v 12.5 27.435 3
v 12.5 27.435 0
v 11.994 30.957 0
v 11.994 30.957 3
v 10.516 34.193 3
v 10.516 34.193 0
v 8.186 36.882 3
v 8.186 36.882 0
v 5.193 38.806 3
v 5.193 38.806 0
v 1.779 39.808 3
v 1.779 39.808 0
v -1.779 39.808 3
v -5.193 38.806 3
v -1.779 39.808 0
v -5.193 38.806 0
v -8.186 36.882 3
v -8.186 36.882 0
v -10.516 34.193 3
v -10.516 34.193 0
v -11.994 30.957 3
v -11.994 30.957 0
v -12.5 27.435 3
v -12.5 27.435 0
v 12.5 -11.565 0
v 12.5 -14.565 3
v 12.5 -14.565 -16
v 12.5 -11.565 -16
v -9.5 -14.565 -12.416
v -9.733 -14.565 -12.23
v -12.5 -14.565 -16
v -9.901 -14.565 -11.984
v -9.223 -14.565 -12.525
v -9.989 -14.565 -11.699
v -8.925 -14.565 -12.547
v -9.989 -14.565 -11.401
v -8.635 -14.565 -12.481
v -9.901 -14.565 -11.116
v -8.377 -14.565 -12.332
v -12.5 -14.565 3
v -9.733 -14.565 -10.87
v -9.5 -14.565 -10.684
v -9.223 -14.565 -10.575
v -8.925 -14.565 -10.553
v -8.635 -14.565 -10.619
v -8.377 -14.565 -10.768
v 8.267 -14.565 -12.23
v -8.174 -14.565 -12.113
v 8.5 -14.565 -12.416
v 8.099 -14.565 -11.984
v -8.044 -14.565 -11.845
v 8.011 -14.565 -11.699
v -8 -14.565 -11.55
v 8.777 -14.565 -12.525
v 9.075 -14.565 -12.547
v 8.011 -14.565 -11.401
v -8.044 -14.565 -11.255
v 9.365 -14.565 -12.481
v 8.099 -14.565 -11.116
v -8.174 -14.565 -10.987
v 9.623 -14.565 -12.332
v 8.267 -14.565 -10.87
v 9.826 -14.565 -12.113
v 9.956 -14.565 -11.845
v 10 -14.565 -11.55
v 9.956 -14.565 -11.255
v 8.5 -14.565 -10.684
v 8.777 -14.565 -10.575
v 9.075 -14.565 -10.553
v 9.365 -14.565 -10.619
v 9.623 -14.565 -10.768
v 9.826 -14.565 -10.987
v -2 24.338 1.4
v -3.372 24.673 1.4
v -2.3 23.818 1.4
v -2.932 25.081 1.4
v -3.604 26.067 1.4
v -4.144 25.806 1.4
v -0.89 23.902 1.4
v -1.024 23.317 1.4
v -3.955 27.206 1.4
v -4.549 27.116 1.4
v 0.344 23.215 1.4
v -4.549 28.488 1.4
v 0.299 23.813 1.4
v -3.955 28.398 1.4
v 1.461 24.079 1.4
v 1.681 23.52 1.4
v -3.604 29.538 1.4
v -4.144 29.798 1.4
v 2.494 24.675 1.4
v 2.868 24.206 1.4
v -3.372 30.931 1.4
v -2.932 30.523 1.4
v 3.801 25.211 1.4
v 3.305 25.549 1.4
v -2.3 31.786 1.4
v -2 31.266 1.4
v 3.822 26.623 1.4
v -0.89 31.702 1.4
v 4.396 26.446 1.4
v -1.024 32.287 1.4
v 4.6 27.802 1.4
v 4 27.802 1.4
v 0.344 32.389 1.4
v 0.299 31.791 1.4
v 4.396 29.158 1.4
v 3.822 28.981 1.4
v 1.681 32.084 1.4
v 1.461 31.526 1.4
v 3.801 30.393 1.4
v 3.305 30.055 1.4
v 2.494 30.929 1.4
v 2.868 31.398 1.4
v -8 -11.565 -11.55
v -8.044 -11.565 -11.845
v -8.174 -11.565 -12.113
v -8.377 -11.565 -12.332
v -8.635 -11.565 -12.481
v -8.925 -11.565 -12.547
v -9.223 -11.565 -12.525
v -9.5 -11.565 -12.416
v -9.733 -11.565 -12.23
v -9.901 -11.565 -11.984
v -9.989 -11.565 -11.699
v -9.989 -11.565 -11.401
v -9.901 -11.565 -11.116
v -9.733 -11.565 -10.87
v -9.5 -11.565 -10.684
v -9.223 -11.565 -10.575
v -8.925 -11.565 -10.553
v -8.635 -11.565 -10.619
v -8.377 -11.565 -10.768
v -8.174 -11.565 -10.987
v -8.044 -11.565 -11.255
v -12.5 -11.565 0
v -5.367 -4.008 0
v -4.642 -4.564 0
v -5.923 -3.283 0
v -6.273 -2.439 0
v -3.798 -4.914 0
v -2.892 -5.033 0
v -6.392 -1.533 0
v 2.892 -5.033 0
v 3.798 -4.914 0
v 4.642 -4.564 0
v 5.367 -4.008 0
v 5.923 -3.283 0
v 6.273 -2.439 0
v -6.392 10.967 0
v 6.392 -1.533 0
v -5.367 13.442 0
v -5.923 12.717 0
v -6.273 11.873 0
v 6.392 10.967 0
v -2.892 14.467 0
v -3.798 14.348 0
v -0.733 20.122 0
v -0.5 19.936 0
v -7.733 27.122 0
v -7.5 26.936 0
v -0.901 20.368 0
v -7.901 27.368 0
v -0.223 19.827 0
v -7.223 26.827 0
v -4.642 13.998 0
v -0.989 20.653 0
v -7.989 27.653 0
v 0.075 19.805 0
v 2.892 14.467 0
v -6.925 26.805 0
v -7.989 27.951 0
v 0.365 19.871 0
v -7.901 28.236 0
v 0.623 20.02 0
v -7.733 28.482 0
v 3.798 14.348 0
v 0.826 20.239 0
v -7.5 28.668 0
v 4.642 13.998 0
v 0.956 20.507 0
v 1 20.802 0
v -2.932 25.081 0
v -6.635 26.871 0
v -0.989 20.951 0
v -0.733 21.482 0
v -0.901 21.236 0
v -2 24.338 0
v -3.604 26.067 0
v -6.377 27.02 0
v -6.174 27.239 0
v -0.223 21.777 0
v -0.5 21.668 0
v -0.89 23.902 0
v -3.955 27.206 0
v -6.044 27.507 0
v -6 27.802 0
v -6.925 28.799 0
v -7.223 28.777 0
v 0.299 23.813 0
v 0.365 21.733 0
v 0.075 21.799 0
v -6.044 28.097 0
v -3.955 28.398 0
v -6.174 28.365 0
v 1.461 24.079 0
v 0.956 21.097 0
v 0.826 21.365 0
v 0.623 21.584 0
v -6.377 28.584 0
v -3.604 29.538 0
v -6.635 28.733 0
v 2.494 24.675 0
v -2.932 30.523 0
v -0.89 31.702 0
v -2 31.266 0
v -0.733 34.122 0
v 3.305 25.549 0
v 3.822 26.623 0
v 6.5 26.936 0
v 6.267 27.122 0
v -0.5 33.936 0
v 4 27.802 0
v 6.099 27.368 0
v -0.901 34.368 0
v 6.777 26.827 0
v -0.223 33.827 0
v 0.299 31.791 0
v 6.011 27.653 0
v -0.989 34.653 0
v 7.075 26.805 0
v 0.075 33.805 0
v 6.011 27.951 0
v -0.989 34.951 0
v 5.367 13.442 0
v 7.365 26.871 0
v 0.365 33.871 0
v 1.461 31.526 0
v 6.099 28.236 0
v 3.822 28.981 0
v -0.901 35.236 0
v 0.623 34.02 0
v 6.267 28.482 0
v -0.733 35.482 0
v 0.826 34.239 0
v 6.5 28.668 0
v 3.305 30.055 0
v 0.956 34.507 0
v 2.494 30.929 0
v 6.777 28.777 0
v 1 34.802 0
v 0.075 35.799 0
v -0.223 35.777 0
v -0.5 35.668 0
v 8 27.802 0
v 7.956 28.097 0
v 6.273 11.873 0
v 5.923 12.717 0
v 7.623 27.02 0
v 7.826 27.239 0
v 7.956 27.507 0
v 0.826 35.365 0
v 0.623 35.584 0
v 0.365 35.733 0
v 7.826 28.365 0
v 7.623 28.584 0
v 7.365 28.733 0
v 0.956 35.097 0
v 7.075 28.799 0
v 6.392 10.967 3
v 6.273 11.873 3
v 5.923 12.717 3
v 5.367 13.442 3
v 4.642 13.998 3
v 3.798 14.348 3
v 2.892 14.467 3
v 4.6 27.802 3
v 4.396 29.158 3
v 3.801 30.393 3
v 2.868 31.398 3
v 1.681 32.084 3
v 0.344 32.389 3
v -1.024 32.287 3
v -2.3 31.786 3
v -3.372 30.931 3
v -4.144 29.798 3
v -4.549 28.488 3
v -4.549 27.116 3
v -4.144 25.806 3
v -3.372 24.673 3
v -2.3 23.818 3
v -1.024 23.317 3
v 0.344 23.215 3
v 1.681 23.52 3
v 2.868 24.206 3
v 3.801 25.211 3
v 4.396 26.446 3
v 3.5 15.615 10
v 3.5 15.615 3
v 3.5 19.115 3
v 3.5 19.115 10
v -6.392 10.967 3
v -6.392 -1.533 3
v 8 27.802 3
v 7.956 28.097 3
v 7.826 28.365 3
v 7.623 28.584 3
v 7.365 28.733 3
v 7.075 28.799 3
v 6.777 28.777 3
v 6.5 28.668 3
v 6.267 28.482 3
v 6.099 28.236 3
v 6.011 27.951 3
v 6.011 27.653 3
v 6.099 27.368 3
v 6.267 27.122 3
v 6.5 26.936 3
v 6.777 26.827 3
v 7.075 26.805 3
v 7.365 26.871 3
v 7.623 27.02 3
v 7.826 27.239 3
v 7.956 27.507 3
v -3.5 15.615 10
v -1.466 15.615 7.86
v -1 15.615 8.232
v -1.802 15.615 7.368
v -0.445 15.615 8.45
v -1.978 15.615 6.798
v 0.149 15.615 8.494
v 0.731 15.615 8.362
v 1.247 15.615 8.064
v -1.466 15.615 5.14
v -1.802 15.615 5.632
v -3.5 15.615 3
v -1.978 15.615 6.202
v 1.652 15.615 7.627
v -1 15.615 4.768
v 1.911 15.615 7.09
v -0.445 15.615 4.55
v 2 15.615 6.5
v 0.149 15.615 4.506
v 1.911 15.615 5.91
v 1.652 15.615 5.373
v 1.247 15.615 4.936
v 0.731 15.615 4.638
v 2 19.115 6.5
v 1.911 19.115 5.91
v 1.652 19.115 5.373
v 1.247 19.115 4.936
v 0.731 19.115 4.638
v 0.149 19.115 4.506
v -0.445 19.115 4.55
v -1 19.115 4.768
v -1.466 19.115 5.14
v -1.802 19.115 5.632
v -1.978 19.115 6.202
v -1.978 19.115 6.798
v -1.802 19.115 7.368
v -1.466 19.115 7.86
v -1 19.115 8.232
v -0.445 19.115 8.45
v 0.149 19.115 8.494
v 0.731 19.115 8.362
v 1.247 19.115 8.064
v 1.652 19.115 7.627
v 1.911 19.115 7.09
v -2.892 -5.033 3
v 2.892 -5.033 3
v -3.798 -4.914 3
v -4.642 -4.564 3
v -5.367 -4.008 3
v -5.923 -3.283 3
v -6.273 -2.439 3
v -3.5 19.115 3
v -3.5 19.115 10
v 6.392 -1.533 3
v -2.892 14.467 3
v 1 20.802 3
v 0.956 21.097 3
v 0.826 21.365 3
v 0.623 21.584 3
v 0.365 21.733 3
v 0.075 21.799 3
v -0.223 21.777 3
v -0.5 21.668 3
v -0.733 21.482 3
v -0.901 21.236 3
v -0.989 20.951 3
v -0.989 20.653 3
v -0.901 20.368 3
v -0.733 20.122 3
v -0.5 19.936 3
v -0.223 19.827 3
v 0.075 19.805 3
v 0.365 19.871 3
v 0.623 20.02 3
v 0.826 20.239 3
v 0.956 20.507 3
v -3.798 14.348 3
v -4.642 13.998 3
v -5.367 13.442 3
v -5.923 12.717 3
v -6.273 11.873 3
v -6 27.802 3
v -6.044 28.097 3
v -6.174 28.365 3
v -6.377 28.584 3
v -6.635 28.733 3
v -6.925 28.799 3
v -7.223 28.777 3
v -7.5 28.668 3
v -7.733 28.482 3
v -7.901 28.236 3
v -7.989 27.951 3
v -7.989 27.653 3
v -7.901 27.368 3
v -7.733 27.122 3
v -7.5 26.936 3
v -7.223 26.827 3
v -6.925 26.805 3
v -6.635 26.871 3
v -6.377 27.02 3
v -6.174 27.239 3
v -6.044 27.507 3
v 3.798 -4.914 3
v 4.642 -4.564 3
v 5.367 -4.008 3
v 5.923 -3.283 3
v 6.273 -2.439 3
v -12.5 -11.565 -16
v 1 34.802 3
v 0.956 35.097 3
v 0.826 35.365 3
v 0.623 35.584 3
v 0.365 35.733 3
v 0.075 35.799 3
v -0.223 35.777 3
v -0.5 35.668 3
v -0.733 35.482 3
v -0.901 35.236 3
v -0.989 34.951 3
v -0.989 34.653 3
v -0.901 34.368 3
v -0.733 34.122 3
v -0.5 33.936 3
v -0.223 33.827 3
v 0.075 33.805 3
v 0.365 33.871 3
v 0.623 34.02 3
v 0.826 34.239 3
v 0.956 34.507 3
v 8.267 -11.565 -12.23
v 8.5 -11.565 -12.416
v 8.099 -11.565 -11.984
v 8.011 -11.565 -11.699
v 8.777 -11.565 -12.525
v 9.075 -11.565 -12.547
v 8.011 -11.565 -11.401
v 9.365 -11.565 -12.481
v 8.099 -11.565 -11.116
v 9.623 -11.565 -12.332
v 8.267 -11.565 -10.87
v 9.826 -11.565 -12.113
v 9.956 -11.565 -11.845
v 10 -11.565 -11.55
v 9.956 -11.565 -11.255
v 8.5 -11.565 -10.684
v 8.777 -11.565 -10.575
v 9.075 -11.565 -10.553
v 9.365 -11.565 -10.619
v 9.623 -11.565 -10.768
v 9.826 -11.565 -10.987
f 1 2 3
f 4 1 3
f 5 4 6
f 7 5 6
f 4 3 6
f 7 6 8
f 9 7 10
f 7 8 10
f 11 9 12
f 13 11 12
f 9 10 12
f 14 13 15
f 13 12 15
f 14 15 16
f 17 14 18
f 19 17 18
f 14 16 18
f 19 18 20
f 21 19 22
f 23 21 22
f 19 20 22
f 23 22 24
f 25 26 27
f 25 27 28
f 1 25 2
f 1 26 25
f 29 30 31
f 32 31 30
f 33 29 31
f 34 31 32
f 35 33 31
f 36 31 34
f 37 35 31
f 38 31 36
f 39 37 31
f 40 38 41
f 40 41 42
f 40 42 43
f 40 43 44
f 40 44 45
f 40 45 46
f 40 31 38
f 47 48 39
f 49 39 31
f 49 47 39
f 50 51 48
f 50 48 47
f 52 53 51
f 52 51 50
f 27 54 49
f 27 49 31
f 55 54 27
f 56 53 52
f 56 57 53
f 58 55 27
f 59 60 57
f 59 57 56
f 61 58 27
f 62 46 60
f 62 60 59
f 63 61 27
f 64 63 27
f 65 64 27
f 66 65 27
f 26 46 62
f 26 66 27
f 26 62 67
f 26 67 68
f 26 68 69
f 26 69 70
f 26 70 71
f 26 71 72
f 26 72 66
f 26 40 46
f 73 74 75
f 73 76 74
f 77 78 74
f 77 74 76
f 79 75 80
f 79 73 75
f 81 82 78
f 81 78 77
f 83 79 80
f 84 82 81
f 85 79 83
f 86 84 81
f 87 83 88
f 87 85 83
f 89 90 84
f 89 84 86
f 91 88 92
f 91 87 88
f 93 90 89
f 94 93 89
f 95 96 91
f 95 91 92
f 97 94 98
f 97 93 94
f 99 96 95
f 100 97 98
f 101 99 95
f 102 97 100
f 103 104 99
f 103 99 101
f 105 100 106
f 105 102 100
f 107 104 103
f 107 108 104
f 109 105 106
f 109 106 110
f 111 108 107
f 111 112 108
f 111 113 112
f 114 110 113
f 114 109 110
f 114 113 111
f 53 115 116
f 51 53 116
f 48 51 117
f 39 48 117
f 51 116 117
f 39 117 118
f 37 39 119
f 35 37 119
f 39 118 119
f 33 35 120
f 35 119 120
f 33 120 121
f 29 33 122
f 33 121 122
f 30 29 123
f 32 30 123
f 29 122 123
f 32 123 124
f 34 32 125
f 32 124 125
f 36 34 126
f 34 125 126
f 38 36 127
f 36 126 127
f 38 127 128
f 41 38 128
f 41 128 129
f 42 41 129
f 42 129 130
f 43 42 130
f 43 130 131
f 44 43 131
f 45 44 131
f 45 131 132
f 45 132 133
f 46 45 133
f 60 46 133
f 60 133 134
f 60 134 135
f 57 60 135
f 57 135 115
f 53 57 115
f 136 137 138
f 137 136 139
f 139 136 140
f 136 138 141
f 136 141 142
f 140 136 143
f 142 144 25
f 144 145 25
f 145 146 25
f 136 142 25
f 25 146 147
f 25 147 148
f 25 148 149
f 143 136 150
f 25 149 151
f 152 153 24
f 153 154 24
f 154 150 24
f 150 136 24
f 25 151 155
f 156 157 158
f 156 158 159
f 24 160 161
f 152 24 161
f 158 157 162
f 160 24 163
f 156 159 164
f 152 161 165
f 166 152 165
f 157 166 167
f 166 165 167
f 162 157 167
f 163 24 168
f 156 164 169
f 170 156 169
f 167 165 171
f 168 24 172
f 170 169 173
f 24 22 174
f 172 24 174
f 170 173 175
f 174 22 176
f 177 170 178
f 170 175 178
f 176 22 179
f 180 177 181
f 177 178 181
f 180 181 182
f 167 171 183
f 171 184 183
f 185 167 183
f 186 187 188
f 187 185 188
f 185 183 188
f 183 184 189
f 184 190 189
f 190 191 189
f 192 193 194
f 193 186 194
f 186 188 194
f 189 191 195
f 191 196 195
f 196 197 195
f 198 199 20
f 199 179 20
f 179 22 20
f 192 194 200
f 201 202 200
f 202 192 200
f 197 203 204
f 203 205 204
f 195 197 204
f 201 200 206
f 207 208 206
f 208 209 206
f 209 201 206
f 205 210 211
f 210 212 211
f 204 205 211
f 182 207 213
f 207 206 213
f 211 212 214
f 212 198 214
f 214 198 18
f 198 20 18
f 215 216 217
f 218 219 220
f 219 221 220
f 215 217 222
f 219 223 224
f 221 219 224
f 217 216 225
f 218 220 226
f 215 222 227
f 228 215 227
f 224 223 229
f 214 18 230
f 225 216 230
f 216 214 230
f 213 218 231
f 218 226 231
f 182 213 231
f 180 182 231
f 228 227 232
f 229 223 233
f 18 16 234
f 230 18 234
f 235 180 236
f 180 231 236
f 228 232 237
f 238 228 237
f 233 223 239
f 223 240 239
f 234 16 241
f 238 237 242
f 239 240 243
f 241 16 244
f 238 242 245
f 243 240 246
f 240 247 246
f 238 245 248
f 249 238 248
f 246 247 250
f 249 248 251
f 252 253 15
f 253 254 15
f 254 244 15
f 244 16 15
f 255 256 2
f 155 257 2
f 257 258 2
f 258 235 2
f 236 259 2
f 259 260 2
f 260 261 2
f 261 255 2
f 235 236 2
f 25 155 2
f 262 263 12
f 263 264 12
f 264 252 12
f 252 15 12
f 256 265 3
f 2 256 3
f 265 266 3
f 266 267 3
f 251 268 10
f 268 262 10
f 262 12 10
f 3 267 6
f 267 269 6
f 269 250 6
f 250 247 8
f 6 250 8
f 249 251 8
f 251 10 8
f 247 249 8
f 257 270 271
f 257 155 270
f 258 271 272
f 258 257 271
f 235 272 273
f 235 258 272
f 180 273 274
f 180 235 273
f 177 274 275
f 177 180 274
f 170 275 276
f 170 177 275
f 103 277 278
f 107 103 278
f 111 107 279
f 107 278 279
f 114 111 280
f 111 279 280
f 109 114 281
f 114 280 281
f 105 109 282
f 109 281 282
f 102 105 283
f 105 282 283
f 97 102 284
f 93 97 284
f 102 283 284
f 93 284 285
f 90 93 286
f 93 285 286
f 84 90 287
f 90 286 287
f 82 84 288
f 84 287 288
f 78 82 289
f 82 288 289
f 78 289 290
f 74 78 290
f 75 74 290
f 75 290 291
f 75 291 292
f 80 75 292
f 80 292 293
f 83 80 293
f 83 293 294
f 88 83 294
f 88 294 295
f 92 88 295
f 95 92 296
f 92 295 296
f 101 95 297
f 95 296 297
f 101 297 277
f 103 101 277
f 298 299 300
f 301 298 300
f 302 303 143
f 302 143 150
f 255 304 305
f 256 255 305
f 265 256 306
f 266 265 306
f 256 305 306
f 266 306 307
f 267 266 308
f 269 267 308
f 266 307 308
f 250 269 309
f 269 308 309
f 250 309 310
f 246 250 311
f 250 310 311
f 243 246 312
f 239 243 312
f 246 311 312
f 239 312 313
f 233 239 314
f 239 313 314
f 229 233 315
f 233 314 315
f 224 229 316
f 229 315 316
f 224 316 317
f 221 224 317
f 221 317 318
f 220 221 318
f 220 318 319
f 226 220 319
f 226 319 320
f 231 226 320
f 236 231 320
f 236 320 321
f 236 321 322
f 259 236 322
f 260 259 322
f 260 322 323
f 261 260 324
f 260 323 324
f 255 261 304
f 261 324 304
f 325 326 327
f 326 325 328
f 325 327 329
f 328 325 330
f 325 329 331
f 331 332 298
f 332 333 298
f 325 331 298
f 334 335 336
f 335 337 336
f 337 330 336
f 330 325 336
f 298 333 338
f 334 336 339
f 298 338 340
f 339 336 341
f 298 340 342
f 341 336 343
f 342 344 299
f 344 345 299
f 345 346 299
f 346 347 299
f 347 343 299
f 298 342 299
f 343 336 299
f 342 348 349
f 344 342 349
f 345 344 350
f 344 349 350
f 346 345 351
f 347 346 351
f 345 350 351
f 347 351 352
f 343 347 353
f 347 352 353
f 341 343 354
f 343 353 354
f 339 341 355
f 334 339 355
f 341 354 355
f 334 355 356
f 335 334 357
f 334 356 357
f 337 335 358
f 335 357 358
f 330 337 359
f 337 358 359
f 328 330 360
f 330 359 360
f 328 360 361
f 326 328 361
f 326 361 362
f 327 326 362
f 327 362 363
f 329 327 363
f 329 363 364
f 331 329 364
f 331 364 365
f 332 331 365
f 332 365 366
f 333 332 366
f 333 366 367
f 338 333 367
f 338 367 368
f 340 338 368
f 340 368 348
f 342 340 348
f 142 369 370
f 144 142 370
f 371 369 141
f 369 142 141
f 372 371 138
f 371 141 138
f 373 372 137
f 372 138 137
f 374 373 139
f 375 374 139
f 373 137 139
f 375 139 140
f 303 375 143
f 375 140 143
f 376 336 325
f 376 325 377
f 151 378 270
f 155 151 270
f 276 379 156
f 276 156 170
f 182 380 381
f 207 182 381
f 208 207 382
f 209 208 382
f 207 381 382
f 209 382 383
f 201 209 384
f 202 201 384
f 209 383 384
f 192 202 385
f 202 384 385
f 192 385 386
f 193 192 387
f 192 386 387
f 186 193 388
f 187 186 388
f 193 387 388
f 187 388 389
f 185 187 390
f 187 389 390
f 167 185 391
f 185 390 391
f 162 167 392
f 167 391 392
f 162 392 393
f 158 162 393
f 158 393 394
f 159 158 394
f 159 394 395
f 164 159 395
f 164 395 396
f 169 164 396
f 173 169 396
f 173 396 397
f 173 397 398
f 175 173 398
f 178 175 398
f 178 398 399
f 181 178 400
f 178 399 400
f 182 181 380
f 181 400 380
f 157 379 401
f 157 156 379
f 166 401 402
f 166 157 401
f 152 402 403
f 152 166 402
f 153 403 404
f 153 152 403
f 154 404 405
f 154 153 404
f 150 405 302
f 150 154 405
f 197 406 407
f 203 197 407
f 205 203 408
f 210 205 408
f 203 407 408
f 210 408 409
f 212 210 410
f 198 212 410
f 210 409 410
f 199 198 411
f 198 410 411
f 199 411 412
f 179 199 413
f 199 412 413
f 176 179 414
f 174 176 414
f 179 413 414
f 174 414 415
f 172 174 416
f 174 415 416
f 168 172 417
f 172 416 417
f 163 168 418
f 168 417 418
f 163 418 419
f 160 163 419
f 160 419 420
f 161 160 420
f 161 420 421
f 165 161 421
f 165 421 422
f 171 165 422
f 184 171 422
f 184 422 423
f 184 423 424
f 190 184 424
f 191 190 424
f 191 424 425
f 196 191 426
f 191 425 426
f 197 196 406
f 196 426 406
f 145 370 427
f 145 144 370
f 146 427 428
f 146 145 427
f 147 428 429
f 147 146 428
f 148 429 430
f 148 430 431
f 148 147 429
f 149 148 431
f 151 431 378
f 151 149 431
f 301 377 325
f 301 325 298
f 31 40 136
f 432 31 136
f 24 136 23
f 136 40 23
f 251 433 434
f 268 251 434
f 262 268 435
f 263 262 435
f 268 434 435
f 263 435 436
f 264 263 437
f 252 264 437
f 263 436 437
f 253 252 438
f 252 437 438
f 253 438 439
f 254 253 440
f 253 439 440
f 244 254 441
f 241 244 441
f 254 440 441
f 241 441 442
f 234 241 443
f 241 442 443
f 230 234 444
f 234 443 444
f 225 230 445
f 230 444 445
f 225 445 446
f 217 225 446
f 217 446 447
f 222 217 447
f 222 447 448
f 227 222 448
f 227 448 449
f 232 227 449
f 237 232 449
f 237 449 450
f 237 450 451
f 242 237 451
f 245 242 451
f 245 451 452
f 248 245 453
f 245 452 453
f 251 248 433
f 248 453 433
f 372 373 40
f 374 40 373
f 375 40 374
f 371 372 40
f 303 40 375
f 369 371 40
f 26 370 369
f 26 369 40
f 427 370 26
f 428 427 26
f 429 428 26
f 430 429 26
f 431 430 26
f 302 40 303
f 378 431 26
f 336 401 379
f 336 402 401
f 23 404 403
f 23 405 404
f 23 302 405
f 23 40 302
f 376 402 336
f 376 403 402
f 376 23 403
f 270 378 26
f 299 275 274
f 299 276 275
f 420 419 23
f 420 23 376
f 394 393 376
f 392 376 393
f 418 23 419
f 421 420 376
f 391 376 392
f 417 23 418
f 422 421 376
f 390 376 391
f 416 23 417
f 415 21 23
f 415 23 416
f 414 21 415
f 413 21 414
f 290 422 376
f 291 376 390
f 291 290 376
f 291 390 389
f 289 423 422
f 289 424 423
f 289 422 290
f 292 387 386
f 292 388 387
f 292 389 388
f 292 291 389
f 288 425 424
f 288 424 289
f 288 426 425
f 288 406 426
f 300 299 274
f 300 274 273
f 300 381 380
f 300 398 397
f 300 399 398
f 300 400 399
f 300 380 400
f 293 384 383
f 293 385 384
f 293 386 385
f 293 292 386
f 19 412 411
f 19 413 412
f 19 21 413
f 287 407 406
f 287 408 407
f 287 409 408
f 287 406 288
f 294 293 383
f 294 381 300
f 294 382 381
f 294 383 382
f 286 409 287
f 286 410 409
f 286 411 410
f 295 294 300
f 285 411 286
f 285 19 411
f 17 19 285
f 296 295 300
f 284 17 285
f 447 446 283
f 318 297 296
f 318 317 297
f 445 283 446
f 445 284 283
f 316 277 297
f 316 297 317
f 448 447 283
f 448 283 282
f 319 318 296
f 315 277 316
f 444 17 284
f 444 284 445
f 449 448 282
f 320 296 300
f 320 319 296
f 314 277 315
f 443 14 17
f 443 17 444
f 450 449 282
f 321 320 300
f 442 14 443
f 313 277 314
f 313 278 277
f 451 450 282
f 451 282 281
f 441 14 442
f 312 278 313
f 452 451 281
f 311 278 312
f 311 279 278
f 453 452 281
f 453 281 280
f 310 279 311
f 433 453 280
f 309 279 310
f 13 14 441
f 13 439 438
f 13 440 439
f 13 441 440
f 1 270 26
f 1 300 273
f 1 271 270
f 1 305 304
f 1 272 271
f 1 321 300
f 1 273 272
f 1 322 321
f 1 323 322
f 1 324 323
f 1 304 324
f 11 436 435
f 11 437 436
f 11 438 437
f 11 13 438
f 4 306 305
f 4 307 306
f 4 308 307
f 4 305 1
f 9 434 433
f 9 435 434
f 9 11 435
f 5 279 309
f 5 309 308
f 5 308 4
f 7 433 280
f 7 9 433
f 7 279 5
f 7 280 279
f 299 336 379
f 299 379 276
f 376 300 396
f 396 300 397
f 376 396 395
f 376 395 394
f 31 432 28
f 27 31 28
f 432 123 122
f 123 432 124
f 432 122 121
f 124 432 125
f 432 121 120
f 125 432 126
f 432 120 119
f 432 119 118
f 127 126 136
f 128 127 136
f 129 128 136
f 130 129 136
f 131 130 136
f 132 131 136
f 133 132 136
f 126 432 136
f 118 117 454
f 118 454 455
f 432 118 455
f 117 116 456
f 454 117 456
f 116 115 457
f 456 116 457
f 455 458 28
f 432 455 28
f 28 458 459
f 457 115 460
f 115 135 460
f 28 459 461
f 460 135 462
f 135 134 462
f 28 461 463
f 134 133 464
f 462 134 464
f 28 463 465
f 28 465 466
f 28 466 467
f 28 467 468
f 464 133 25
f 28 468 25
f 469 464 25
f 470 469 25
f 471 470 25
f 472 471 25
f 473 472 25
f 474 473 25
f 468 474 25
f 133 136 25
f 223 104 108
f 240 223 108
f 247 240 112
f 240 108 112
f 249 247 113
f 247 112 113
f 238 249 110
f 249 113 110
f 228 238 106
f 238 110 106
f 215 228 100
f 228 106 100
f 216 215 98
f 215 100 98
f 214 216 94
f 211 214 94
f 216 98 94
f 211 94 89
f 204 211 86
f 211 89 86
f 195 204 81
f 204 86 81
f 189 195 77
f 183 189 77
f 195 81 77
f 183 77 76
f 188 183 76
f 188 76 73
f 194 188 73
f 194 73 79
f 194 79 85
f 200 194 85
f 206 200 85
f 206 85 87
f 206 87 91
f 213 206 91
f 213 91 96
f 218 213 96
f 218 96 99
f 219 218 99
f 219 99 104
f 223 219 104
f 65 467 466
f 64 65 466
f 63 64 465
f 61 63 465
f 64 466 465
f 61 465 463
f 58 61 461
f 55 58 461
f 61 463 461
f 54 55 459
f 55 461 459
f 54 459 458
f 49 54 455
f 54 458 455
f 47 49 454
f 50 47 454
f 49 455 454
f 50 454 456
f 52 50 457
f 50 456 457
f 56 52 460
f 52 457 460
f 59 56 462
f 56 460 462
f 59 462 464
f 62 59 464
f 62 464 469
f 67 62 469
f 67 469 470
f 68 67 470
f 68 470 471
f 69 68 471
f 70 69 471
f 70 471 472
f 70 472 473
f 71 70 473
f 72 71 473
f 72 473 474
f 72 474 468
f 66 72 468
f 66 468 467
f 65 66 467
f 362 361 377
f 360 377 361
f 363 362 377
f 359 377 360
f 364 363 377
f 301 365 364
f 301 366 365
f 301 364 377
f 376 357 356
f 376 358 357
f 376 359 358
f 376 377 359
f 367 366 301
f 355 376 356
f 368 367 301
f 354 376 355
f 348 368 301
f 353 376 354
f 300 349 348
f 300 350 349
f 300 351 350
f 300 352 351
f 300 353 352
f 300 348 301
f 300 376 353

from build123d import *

# Parameters (mm, degrees)
SKETCH1_W           = 25
SKETCH1_H           = 38.558203604
SKETCH1_H_2         = 3.441796396
BOSS_EXTRUDE1_DEPTH = 3
SKETCH2_R           = 4
SKETCH2_R_2         = 1
CUT_EXTRUDE1_DEPTH  = 3
SKETCH4_R           = 4.6
CUT_EXTRUDE2_DEPTH  = 1.6
SKETCH5_W           = 25
SKETCH5_H           = 3
BOSS_EXTRUDE3_DEPTH = 19
SKETCH7_R           = 1
CUT_EXTRUDE4_DEPTH  = 4
SKETCH8_W           = 12.783853214
SKETCH8_H           = 19.5
CUT_EXTRUDE5_DEPTH  = 4
FILLET1_R           = 3.5
SKETCH9_W           = 7
SKETCH9_H           = 3.5
BOSS_EXTRUDE4_DEPTH = 7
SKETCH10_R          = 2
CUT_EXTRUDE6_DEPTH  = 7


with BuildPart() as part:
    # Sketch1 → Boss-Extrude1 (new body)
    with BuildSketch(Plane.XY):
        with Locations((0, 8.156339421)):
            Rectangle(SKETCH1_W, SKETCH1_H)
        with BuildLine():
            Line((-12.5, 27.435441223), (12.5, 27.435441223))
            ThreePointArc((12.5, 27.435441223), (0, 39.935441223), (-12.5, 27.435441223))
        make_face()
        with Locations((0, -12.843660579)):
            Rectangle(SKETCH1_W, SKETCH1_H_2)
    extrude(amount=BOSS_EXTRUDE1_DEPTH)

    # Sketch2 → Cut-Extrude1 (cut)
    with BuildSketch(Plane.XY.offset(3)):
        with Locations((0, 27.802049159)):
            Circle(SKETCH2_R)
        with Locations((0, 34.802049159)):
            Circle(SKETCH2_R_2)
        with Locations((7, 27.802049159)):
            Circle(SKETCH2_R_2)
        with Locations((0, 20.802049159)):
            Circle(SKETCH2_R_2)
        with Locations((-7, 27.802049159)):
            Circle(SKETCH2_R_2)
    extrude(amount=-CUT_EXTRUDE1_DEPTH, mode=Mode.SUBTRACT)

    # Sketch4 → Cut-Extrude2 (cut)
    with BuildSketch(Plane.XY.offset(3)):
        with Locations((0, 27.802049159)):
            Circle(SKETCH4_R)
    extrude(amount=-CUT_EXTRUDE2_DEPTH, mode=Mode.SUBTRACT)

    # Sketch5 → Boss-Extrude3 (add)
    with BuildSketch(Plane.XY.offset(3)):
        with Locations((0, -13.064558777)):
            Rectangle(SKETCH5_W, SKETCH5_H)
    extrude(amount=-BOSS_EXTRUDE3_DEPTH)

    # Sketch7 → Cut-Extrude4 (cut)
    with BuildSketch(Plane(origin=(0, -11.564558777, 0), x_dir=(1, 0, 0), z_dir=(0, 1, 0))):
        with Locations((9, 11.55)):
            Circle(SKETCH7_R)
        with Locations((-9, 11.55)):
            Circle(SKETCH7_R)
    extrude(amount=-CUT_EXTRUDE4_DEPTH, mode=Mode.SUBTRACT)

    # Sketch8 → Cut-Extrude5 (cut)
    with BuildSketch(Plane.XY.offset(3)):
        with Locations((0, 4.716978639)):
            Rectangle(SKETCH8_W, SKETCH8_H)
    extrude(amount=-CUT_EXTRUDE5_DEPTH, mode=Mode.SUBTRACT)

    # Fillet1
    fillet1_edges = [part.edges().sort_by_distance(p)[0] for p in [
        (6.391926607, 14.466978639, 1.5),
        (6.391926607, -5.033021361, 1.5),
        (-6.391926607, -5.033021361, 1.5),
        (-6.391926607, 14.466978639, 1.5),
    ]]
    fillet(fillet1_edges, radius=FILLET1_R)

    # Sketch9 → Boss-Extrude4 (add)
    with BuildSketch(Plane.XY.offset(3)):
        with Locations((0, 17.365441223)):
            Rectangle(SKETCH9_W, SKETCH9_H)
    extrude(amount=BOSS_EXTRUDE4_DEPTH)

    # Sketch10 → Cut-Extrude6 (cut)
    with BuildSketch(Plane(origin=(0, 19.115441223, 0), x_dir=(1, 0, 0), z_dir=(0, 1, 0))):
        with Locations((0, -6.5)):
            Circle(SKETCH10_R)
    extrude(amount=-CUT_EXTRUDE6_DEPTH, mode=Mode.SUBTRACT)


solid = part.part
